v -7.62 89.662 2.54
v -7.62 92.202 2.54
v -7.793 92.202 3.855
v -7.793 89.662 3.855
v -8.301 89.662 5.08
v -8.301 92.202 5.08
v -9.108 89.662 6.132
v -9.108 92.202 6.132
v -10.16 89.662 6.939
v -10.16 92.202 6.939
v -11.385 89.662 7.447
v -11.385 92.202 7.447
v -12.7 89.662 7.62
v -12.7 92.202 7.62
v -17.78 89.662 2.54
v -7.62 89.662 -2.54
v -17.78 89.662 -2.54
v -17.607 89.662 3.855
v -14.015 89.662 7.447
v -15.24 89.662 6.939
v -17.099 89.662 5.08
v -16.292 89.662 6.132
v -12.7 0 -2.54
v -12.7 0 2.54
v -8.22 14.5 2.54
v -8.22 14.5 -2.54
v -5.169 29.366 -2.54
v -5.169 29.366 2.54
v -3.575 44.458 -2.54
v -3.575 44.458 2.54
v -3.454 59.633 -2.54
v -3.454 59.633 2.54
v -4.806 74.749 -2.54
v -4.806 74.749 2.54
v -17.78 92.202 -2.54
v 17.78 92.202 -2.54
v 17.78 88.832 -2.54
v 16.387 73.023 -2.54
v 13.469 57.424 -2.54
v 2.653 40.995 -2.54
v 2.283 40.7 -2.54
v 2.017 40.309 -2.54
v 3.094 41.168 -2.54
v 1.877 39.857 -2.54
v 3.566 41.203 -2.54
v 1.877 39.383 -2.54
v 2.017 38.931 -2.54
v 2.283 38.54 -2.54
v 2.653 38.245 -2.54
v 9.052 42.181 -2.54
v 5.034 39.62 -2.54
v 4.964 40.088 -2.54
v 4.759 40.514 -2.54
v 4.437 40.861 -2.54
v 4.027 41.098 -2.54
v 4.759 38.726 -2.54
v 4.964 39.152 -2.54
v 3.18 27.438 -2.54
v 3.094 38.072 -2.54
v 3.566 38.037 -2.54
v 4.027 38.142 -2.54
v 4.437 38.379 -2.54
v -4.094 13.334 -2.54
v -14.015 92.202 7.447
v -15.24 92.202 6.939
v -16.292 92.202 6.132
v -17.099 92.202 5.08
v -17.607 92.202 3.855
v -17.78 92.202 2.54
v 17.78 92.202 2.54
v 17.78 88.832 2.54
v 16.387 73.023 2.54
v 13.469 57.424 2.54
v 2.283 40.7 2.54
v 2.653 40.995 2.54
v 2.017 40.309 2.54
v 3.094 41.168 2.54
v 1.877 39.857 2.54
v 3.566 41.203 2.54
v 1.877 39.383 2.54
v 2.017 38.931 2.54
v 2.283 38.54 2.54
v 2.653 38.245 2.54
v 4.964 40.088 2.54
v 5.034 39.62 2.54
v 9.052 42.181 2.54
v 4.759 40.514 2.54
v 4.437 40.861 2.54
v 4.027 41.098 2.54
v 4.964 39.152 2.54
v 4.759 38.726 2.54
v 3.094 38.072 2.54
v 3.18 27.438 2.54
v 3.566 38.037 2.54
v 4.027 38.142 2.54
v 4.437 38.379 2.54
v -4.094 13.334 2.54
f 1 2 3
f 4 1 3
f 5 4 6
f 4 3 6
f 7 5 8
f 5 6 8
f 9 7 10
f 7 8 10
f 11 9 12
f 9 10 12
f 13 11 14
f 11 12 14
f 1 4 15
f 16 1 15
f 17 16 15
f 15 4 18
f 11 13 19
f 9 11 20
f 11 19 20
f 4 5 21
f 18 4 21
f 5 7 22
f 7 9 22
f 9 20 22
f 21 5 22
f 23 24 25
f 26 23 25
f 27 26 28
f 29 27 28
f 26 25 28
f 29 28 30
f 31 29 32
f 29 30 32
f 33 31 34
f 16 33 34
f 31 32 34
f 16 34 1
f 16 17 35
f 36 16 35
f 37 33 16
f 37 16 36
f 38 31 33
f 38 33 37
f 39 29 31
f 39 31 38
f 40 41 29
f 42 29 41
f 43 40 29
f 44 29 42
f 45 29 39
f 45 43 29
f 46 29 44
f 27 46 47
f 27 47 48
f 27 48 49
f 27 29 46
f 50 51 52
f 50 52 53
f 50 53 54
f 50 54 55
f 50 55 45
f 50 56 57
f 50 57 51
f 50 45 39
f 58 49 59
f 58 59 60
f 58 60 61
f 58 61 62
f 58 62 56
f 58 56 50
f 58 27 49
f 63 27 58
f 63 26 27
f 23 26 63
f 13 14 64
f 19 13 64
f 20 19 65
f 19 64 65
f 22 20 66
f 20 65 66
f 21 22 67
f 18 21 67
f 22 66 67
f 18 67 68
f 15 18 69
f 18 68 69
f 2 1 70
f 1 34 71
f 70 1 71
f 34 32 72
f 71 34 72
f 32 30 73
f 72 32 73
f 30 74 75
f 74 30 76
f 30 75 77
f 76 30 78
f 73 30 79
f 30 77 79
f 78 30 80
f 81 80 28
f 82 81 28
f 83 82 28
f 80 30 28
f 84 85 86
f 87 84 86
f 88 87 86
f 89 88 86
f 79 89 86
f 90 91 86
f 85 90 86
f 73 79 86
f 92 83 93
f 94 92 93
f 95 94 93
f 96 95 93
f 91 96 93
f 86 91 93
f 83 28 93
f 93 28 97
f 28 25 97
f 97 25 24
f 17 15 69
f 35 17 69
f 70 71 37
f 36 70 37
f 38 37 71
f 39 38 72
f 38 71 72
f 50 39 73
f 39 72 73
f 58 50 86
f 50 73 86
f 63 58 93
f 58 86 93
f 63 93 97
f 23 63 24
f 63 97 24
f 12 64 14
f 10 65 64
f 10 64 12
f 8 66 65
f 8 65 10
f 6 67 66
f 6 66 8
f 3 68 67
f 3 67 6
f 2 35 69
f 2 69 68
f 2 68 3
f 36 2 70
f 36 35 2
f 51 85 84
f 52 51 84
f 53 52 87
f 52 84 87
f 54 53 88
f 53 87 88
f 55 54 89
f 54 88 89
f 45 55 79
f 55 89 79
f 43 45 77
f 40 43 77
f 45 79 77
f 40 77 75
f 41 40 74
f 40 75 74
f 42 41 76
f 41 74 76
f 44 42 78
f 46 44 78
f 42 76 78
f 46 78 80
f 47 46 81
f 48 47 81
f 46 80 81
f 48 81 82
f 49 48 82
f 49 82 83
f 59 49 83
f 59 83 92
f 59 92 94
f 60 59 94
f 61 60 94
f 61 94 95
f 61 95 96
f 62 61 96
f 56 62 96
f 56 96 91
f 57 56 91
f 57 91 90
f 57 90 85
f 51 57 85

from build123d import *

# Parameters (mm, degrees)
SKETCH1_W           = 35.56
SKETCH1_H           = 5.08
BOSS_EXTRUDE1_DEPTH = 92.202
SKETCH4_W           = 10.16
SKETCH4_H           = 2.54
BOSS_EXTRUDE4_DEPTH = 5.08
CUT_EXTRUDE1_DEPTH  = 2.54
CUT_EXTRUDE3_DEPTH  = 95.037990217
SKETCH13_R          = 1.5875
CUT_EXTRUDE4_DEPTH  = 95.037990217


with BuildPart() as part:
    # Sketch1 → Boss-Extrude1 (new body)
    with BuildSketch(Plane(origin=(0, 0, 0), x_dir=(1, 0, 0), z_dir=(0, 1, 0))):
        Rectangle(SKETCH1_W, SKETCH1_H)
    extrude(amount=BOSS_EXTRUDE1_DEPTH)

    # Sketch4 → Boss-Extrude4 (add)
    with BuildSketch(Plane.XY.offset(2.54)):
        with Locations((-12.7, 90.932)):
            Rectangle(SKETCH4_W, SKETCH4_H)
    extrude(amount=BOSS_EXTRUDE4_DEPTH)

    # Sketch5 → Cut-Extrude1 (cut)
    with BuildSketch(Plane(origin=(0, 92.202, 0), x_dir=(1, 0, 0), z_dir=(0, 1, 0))):
        with BuildLine():
            ThreePointArc((-12.7, -7.62), (-16.292102448, -6.132102448), (-17.78, -2.54))
            Line((-17.78, -2.54), (-17.78, -7.62))
            Line((-17.78, -7.62), (-12.7, -7.62))
        make_face()
        with BuildLine():
            Line((-7.62, -7.62), (-7.62, -2.54))
            ThreePointArc((-7.62, -2.54), (-9.107897552, -6.132102448), (-12.7, -7.62))
            Line((-12.7, -7.62), (-7.62, -7.62))
        make_face()
    extrude(amount=-CUT_EXTRUDE1_DEPTH, mode=Mode.SUBTRACT)

    # Sketch7 → Cut-Extrude3 (cut, through all)
    with BuildSketch(Plane.XY.offset(2.54)):
        with BuildLine():
            ThreePointArc((-12.7, 0), (-3.575035086, 44.457914169), (-7.62, 89.662))
            Line((-7.62, 89.662), (-17.78, 89.662))
            Line((-17.78, 89.662), (-17.78, 0))
            Line((-17.78, 0), (-12.7, 0))
        make_face()
        with BuildLine():
            ThreePointArc((17.78, 88.831864431), (9.052257411, 42.18144567), (-12.7, 0))
            Line((-12.7, 0), (17.78, 0))
            Line((17.78, 0), (17.78, 88.831864431))
        make_face()
    extrude(amount=-CUT_EXTRUDE3_DEPTH, mode=Mode.SUBTRACT)

    # Sketch13 → Cut-Extrude4 (cut, through all)
    with BuildSketch(Plane.XY.offset(2.54)):
        with Locations((3.446895522, 39.620022835)):
            Circle(SKETCH13_R)
    extrude(amount=-CUT_EXTRUDE4_DEPTH, mode=Mode.SUBTRACT)


solid = part.part
